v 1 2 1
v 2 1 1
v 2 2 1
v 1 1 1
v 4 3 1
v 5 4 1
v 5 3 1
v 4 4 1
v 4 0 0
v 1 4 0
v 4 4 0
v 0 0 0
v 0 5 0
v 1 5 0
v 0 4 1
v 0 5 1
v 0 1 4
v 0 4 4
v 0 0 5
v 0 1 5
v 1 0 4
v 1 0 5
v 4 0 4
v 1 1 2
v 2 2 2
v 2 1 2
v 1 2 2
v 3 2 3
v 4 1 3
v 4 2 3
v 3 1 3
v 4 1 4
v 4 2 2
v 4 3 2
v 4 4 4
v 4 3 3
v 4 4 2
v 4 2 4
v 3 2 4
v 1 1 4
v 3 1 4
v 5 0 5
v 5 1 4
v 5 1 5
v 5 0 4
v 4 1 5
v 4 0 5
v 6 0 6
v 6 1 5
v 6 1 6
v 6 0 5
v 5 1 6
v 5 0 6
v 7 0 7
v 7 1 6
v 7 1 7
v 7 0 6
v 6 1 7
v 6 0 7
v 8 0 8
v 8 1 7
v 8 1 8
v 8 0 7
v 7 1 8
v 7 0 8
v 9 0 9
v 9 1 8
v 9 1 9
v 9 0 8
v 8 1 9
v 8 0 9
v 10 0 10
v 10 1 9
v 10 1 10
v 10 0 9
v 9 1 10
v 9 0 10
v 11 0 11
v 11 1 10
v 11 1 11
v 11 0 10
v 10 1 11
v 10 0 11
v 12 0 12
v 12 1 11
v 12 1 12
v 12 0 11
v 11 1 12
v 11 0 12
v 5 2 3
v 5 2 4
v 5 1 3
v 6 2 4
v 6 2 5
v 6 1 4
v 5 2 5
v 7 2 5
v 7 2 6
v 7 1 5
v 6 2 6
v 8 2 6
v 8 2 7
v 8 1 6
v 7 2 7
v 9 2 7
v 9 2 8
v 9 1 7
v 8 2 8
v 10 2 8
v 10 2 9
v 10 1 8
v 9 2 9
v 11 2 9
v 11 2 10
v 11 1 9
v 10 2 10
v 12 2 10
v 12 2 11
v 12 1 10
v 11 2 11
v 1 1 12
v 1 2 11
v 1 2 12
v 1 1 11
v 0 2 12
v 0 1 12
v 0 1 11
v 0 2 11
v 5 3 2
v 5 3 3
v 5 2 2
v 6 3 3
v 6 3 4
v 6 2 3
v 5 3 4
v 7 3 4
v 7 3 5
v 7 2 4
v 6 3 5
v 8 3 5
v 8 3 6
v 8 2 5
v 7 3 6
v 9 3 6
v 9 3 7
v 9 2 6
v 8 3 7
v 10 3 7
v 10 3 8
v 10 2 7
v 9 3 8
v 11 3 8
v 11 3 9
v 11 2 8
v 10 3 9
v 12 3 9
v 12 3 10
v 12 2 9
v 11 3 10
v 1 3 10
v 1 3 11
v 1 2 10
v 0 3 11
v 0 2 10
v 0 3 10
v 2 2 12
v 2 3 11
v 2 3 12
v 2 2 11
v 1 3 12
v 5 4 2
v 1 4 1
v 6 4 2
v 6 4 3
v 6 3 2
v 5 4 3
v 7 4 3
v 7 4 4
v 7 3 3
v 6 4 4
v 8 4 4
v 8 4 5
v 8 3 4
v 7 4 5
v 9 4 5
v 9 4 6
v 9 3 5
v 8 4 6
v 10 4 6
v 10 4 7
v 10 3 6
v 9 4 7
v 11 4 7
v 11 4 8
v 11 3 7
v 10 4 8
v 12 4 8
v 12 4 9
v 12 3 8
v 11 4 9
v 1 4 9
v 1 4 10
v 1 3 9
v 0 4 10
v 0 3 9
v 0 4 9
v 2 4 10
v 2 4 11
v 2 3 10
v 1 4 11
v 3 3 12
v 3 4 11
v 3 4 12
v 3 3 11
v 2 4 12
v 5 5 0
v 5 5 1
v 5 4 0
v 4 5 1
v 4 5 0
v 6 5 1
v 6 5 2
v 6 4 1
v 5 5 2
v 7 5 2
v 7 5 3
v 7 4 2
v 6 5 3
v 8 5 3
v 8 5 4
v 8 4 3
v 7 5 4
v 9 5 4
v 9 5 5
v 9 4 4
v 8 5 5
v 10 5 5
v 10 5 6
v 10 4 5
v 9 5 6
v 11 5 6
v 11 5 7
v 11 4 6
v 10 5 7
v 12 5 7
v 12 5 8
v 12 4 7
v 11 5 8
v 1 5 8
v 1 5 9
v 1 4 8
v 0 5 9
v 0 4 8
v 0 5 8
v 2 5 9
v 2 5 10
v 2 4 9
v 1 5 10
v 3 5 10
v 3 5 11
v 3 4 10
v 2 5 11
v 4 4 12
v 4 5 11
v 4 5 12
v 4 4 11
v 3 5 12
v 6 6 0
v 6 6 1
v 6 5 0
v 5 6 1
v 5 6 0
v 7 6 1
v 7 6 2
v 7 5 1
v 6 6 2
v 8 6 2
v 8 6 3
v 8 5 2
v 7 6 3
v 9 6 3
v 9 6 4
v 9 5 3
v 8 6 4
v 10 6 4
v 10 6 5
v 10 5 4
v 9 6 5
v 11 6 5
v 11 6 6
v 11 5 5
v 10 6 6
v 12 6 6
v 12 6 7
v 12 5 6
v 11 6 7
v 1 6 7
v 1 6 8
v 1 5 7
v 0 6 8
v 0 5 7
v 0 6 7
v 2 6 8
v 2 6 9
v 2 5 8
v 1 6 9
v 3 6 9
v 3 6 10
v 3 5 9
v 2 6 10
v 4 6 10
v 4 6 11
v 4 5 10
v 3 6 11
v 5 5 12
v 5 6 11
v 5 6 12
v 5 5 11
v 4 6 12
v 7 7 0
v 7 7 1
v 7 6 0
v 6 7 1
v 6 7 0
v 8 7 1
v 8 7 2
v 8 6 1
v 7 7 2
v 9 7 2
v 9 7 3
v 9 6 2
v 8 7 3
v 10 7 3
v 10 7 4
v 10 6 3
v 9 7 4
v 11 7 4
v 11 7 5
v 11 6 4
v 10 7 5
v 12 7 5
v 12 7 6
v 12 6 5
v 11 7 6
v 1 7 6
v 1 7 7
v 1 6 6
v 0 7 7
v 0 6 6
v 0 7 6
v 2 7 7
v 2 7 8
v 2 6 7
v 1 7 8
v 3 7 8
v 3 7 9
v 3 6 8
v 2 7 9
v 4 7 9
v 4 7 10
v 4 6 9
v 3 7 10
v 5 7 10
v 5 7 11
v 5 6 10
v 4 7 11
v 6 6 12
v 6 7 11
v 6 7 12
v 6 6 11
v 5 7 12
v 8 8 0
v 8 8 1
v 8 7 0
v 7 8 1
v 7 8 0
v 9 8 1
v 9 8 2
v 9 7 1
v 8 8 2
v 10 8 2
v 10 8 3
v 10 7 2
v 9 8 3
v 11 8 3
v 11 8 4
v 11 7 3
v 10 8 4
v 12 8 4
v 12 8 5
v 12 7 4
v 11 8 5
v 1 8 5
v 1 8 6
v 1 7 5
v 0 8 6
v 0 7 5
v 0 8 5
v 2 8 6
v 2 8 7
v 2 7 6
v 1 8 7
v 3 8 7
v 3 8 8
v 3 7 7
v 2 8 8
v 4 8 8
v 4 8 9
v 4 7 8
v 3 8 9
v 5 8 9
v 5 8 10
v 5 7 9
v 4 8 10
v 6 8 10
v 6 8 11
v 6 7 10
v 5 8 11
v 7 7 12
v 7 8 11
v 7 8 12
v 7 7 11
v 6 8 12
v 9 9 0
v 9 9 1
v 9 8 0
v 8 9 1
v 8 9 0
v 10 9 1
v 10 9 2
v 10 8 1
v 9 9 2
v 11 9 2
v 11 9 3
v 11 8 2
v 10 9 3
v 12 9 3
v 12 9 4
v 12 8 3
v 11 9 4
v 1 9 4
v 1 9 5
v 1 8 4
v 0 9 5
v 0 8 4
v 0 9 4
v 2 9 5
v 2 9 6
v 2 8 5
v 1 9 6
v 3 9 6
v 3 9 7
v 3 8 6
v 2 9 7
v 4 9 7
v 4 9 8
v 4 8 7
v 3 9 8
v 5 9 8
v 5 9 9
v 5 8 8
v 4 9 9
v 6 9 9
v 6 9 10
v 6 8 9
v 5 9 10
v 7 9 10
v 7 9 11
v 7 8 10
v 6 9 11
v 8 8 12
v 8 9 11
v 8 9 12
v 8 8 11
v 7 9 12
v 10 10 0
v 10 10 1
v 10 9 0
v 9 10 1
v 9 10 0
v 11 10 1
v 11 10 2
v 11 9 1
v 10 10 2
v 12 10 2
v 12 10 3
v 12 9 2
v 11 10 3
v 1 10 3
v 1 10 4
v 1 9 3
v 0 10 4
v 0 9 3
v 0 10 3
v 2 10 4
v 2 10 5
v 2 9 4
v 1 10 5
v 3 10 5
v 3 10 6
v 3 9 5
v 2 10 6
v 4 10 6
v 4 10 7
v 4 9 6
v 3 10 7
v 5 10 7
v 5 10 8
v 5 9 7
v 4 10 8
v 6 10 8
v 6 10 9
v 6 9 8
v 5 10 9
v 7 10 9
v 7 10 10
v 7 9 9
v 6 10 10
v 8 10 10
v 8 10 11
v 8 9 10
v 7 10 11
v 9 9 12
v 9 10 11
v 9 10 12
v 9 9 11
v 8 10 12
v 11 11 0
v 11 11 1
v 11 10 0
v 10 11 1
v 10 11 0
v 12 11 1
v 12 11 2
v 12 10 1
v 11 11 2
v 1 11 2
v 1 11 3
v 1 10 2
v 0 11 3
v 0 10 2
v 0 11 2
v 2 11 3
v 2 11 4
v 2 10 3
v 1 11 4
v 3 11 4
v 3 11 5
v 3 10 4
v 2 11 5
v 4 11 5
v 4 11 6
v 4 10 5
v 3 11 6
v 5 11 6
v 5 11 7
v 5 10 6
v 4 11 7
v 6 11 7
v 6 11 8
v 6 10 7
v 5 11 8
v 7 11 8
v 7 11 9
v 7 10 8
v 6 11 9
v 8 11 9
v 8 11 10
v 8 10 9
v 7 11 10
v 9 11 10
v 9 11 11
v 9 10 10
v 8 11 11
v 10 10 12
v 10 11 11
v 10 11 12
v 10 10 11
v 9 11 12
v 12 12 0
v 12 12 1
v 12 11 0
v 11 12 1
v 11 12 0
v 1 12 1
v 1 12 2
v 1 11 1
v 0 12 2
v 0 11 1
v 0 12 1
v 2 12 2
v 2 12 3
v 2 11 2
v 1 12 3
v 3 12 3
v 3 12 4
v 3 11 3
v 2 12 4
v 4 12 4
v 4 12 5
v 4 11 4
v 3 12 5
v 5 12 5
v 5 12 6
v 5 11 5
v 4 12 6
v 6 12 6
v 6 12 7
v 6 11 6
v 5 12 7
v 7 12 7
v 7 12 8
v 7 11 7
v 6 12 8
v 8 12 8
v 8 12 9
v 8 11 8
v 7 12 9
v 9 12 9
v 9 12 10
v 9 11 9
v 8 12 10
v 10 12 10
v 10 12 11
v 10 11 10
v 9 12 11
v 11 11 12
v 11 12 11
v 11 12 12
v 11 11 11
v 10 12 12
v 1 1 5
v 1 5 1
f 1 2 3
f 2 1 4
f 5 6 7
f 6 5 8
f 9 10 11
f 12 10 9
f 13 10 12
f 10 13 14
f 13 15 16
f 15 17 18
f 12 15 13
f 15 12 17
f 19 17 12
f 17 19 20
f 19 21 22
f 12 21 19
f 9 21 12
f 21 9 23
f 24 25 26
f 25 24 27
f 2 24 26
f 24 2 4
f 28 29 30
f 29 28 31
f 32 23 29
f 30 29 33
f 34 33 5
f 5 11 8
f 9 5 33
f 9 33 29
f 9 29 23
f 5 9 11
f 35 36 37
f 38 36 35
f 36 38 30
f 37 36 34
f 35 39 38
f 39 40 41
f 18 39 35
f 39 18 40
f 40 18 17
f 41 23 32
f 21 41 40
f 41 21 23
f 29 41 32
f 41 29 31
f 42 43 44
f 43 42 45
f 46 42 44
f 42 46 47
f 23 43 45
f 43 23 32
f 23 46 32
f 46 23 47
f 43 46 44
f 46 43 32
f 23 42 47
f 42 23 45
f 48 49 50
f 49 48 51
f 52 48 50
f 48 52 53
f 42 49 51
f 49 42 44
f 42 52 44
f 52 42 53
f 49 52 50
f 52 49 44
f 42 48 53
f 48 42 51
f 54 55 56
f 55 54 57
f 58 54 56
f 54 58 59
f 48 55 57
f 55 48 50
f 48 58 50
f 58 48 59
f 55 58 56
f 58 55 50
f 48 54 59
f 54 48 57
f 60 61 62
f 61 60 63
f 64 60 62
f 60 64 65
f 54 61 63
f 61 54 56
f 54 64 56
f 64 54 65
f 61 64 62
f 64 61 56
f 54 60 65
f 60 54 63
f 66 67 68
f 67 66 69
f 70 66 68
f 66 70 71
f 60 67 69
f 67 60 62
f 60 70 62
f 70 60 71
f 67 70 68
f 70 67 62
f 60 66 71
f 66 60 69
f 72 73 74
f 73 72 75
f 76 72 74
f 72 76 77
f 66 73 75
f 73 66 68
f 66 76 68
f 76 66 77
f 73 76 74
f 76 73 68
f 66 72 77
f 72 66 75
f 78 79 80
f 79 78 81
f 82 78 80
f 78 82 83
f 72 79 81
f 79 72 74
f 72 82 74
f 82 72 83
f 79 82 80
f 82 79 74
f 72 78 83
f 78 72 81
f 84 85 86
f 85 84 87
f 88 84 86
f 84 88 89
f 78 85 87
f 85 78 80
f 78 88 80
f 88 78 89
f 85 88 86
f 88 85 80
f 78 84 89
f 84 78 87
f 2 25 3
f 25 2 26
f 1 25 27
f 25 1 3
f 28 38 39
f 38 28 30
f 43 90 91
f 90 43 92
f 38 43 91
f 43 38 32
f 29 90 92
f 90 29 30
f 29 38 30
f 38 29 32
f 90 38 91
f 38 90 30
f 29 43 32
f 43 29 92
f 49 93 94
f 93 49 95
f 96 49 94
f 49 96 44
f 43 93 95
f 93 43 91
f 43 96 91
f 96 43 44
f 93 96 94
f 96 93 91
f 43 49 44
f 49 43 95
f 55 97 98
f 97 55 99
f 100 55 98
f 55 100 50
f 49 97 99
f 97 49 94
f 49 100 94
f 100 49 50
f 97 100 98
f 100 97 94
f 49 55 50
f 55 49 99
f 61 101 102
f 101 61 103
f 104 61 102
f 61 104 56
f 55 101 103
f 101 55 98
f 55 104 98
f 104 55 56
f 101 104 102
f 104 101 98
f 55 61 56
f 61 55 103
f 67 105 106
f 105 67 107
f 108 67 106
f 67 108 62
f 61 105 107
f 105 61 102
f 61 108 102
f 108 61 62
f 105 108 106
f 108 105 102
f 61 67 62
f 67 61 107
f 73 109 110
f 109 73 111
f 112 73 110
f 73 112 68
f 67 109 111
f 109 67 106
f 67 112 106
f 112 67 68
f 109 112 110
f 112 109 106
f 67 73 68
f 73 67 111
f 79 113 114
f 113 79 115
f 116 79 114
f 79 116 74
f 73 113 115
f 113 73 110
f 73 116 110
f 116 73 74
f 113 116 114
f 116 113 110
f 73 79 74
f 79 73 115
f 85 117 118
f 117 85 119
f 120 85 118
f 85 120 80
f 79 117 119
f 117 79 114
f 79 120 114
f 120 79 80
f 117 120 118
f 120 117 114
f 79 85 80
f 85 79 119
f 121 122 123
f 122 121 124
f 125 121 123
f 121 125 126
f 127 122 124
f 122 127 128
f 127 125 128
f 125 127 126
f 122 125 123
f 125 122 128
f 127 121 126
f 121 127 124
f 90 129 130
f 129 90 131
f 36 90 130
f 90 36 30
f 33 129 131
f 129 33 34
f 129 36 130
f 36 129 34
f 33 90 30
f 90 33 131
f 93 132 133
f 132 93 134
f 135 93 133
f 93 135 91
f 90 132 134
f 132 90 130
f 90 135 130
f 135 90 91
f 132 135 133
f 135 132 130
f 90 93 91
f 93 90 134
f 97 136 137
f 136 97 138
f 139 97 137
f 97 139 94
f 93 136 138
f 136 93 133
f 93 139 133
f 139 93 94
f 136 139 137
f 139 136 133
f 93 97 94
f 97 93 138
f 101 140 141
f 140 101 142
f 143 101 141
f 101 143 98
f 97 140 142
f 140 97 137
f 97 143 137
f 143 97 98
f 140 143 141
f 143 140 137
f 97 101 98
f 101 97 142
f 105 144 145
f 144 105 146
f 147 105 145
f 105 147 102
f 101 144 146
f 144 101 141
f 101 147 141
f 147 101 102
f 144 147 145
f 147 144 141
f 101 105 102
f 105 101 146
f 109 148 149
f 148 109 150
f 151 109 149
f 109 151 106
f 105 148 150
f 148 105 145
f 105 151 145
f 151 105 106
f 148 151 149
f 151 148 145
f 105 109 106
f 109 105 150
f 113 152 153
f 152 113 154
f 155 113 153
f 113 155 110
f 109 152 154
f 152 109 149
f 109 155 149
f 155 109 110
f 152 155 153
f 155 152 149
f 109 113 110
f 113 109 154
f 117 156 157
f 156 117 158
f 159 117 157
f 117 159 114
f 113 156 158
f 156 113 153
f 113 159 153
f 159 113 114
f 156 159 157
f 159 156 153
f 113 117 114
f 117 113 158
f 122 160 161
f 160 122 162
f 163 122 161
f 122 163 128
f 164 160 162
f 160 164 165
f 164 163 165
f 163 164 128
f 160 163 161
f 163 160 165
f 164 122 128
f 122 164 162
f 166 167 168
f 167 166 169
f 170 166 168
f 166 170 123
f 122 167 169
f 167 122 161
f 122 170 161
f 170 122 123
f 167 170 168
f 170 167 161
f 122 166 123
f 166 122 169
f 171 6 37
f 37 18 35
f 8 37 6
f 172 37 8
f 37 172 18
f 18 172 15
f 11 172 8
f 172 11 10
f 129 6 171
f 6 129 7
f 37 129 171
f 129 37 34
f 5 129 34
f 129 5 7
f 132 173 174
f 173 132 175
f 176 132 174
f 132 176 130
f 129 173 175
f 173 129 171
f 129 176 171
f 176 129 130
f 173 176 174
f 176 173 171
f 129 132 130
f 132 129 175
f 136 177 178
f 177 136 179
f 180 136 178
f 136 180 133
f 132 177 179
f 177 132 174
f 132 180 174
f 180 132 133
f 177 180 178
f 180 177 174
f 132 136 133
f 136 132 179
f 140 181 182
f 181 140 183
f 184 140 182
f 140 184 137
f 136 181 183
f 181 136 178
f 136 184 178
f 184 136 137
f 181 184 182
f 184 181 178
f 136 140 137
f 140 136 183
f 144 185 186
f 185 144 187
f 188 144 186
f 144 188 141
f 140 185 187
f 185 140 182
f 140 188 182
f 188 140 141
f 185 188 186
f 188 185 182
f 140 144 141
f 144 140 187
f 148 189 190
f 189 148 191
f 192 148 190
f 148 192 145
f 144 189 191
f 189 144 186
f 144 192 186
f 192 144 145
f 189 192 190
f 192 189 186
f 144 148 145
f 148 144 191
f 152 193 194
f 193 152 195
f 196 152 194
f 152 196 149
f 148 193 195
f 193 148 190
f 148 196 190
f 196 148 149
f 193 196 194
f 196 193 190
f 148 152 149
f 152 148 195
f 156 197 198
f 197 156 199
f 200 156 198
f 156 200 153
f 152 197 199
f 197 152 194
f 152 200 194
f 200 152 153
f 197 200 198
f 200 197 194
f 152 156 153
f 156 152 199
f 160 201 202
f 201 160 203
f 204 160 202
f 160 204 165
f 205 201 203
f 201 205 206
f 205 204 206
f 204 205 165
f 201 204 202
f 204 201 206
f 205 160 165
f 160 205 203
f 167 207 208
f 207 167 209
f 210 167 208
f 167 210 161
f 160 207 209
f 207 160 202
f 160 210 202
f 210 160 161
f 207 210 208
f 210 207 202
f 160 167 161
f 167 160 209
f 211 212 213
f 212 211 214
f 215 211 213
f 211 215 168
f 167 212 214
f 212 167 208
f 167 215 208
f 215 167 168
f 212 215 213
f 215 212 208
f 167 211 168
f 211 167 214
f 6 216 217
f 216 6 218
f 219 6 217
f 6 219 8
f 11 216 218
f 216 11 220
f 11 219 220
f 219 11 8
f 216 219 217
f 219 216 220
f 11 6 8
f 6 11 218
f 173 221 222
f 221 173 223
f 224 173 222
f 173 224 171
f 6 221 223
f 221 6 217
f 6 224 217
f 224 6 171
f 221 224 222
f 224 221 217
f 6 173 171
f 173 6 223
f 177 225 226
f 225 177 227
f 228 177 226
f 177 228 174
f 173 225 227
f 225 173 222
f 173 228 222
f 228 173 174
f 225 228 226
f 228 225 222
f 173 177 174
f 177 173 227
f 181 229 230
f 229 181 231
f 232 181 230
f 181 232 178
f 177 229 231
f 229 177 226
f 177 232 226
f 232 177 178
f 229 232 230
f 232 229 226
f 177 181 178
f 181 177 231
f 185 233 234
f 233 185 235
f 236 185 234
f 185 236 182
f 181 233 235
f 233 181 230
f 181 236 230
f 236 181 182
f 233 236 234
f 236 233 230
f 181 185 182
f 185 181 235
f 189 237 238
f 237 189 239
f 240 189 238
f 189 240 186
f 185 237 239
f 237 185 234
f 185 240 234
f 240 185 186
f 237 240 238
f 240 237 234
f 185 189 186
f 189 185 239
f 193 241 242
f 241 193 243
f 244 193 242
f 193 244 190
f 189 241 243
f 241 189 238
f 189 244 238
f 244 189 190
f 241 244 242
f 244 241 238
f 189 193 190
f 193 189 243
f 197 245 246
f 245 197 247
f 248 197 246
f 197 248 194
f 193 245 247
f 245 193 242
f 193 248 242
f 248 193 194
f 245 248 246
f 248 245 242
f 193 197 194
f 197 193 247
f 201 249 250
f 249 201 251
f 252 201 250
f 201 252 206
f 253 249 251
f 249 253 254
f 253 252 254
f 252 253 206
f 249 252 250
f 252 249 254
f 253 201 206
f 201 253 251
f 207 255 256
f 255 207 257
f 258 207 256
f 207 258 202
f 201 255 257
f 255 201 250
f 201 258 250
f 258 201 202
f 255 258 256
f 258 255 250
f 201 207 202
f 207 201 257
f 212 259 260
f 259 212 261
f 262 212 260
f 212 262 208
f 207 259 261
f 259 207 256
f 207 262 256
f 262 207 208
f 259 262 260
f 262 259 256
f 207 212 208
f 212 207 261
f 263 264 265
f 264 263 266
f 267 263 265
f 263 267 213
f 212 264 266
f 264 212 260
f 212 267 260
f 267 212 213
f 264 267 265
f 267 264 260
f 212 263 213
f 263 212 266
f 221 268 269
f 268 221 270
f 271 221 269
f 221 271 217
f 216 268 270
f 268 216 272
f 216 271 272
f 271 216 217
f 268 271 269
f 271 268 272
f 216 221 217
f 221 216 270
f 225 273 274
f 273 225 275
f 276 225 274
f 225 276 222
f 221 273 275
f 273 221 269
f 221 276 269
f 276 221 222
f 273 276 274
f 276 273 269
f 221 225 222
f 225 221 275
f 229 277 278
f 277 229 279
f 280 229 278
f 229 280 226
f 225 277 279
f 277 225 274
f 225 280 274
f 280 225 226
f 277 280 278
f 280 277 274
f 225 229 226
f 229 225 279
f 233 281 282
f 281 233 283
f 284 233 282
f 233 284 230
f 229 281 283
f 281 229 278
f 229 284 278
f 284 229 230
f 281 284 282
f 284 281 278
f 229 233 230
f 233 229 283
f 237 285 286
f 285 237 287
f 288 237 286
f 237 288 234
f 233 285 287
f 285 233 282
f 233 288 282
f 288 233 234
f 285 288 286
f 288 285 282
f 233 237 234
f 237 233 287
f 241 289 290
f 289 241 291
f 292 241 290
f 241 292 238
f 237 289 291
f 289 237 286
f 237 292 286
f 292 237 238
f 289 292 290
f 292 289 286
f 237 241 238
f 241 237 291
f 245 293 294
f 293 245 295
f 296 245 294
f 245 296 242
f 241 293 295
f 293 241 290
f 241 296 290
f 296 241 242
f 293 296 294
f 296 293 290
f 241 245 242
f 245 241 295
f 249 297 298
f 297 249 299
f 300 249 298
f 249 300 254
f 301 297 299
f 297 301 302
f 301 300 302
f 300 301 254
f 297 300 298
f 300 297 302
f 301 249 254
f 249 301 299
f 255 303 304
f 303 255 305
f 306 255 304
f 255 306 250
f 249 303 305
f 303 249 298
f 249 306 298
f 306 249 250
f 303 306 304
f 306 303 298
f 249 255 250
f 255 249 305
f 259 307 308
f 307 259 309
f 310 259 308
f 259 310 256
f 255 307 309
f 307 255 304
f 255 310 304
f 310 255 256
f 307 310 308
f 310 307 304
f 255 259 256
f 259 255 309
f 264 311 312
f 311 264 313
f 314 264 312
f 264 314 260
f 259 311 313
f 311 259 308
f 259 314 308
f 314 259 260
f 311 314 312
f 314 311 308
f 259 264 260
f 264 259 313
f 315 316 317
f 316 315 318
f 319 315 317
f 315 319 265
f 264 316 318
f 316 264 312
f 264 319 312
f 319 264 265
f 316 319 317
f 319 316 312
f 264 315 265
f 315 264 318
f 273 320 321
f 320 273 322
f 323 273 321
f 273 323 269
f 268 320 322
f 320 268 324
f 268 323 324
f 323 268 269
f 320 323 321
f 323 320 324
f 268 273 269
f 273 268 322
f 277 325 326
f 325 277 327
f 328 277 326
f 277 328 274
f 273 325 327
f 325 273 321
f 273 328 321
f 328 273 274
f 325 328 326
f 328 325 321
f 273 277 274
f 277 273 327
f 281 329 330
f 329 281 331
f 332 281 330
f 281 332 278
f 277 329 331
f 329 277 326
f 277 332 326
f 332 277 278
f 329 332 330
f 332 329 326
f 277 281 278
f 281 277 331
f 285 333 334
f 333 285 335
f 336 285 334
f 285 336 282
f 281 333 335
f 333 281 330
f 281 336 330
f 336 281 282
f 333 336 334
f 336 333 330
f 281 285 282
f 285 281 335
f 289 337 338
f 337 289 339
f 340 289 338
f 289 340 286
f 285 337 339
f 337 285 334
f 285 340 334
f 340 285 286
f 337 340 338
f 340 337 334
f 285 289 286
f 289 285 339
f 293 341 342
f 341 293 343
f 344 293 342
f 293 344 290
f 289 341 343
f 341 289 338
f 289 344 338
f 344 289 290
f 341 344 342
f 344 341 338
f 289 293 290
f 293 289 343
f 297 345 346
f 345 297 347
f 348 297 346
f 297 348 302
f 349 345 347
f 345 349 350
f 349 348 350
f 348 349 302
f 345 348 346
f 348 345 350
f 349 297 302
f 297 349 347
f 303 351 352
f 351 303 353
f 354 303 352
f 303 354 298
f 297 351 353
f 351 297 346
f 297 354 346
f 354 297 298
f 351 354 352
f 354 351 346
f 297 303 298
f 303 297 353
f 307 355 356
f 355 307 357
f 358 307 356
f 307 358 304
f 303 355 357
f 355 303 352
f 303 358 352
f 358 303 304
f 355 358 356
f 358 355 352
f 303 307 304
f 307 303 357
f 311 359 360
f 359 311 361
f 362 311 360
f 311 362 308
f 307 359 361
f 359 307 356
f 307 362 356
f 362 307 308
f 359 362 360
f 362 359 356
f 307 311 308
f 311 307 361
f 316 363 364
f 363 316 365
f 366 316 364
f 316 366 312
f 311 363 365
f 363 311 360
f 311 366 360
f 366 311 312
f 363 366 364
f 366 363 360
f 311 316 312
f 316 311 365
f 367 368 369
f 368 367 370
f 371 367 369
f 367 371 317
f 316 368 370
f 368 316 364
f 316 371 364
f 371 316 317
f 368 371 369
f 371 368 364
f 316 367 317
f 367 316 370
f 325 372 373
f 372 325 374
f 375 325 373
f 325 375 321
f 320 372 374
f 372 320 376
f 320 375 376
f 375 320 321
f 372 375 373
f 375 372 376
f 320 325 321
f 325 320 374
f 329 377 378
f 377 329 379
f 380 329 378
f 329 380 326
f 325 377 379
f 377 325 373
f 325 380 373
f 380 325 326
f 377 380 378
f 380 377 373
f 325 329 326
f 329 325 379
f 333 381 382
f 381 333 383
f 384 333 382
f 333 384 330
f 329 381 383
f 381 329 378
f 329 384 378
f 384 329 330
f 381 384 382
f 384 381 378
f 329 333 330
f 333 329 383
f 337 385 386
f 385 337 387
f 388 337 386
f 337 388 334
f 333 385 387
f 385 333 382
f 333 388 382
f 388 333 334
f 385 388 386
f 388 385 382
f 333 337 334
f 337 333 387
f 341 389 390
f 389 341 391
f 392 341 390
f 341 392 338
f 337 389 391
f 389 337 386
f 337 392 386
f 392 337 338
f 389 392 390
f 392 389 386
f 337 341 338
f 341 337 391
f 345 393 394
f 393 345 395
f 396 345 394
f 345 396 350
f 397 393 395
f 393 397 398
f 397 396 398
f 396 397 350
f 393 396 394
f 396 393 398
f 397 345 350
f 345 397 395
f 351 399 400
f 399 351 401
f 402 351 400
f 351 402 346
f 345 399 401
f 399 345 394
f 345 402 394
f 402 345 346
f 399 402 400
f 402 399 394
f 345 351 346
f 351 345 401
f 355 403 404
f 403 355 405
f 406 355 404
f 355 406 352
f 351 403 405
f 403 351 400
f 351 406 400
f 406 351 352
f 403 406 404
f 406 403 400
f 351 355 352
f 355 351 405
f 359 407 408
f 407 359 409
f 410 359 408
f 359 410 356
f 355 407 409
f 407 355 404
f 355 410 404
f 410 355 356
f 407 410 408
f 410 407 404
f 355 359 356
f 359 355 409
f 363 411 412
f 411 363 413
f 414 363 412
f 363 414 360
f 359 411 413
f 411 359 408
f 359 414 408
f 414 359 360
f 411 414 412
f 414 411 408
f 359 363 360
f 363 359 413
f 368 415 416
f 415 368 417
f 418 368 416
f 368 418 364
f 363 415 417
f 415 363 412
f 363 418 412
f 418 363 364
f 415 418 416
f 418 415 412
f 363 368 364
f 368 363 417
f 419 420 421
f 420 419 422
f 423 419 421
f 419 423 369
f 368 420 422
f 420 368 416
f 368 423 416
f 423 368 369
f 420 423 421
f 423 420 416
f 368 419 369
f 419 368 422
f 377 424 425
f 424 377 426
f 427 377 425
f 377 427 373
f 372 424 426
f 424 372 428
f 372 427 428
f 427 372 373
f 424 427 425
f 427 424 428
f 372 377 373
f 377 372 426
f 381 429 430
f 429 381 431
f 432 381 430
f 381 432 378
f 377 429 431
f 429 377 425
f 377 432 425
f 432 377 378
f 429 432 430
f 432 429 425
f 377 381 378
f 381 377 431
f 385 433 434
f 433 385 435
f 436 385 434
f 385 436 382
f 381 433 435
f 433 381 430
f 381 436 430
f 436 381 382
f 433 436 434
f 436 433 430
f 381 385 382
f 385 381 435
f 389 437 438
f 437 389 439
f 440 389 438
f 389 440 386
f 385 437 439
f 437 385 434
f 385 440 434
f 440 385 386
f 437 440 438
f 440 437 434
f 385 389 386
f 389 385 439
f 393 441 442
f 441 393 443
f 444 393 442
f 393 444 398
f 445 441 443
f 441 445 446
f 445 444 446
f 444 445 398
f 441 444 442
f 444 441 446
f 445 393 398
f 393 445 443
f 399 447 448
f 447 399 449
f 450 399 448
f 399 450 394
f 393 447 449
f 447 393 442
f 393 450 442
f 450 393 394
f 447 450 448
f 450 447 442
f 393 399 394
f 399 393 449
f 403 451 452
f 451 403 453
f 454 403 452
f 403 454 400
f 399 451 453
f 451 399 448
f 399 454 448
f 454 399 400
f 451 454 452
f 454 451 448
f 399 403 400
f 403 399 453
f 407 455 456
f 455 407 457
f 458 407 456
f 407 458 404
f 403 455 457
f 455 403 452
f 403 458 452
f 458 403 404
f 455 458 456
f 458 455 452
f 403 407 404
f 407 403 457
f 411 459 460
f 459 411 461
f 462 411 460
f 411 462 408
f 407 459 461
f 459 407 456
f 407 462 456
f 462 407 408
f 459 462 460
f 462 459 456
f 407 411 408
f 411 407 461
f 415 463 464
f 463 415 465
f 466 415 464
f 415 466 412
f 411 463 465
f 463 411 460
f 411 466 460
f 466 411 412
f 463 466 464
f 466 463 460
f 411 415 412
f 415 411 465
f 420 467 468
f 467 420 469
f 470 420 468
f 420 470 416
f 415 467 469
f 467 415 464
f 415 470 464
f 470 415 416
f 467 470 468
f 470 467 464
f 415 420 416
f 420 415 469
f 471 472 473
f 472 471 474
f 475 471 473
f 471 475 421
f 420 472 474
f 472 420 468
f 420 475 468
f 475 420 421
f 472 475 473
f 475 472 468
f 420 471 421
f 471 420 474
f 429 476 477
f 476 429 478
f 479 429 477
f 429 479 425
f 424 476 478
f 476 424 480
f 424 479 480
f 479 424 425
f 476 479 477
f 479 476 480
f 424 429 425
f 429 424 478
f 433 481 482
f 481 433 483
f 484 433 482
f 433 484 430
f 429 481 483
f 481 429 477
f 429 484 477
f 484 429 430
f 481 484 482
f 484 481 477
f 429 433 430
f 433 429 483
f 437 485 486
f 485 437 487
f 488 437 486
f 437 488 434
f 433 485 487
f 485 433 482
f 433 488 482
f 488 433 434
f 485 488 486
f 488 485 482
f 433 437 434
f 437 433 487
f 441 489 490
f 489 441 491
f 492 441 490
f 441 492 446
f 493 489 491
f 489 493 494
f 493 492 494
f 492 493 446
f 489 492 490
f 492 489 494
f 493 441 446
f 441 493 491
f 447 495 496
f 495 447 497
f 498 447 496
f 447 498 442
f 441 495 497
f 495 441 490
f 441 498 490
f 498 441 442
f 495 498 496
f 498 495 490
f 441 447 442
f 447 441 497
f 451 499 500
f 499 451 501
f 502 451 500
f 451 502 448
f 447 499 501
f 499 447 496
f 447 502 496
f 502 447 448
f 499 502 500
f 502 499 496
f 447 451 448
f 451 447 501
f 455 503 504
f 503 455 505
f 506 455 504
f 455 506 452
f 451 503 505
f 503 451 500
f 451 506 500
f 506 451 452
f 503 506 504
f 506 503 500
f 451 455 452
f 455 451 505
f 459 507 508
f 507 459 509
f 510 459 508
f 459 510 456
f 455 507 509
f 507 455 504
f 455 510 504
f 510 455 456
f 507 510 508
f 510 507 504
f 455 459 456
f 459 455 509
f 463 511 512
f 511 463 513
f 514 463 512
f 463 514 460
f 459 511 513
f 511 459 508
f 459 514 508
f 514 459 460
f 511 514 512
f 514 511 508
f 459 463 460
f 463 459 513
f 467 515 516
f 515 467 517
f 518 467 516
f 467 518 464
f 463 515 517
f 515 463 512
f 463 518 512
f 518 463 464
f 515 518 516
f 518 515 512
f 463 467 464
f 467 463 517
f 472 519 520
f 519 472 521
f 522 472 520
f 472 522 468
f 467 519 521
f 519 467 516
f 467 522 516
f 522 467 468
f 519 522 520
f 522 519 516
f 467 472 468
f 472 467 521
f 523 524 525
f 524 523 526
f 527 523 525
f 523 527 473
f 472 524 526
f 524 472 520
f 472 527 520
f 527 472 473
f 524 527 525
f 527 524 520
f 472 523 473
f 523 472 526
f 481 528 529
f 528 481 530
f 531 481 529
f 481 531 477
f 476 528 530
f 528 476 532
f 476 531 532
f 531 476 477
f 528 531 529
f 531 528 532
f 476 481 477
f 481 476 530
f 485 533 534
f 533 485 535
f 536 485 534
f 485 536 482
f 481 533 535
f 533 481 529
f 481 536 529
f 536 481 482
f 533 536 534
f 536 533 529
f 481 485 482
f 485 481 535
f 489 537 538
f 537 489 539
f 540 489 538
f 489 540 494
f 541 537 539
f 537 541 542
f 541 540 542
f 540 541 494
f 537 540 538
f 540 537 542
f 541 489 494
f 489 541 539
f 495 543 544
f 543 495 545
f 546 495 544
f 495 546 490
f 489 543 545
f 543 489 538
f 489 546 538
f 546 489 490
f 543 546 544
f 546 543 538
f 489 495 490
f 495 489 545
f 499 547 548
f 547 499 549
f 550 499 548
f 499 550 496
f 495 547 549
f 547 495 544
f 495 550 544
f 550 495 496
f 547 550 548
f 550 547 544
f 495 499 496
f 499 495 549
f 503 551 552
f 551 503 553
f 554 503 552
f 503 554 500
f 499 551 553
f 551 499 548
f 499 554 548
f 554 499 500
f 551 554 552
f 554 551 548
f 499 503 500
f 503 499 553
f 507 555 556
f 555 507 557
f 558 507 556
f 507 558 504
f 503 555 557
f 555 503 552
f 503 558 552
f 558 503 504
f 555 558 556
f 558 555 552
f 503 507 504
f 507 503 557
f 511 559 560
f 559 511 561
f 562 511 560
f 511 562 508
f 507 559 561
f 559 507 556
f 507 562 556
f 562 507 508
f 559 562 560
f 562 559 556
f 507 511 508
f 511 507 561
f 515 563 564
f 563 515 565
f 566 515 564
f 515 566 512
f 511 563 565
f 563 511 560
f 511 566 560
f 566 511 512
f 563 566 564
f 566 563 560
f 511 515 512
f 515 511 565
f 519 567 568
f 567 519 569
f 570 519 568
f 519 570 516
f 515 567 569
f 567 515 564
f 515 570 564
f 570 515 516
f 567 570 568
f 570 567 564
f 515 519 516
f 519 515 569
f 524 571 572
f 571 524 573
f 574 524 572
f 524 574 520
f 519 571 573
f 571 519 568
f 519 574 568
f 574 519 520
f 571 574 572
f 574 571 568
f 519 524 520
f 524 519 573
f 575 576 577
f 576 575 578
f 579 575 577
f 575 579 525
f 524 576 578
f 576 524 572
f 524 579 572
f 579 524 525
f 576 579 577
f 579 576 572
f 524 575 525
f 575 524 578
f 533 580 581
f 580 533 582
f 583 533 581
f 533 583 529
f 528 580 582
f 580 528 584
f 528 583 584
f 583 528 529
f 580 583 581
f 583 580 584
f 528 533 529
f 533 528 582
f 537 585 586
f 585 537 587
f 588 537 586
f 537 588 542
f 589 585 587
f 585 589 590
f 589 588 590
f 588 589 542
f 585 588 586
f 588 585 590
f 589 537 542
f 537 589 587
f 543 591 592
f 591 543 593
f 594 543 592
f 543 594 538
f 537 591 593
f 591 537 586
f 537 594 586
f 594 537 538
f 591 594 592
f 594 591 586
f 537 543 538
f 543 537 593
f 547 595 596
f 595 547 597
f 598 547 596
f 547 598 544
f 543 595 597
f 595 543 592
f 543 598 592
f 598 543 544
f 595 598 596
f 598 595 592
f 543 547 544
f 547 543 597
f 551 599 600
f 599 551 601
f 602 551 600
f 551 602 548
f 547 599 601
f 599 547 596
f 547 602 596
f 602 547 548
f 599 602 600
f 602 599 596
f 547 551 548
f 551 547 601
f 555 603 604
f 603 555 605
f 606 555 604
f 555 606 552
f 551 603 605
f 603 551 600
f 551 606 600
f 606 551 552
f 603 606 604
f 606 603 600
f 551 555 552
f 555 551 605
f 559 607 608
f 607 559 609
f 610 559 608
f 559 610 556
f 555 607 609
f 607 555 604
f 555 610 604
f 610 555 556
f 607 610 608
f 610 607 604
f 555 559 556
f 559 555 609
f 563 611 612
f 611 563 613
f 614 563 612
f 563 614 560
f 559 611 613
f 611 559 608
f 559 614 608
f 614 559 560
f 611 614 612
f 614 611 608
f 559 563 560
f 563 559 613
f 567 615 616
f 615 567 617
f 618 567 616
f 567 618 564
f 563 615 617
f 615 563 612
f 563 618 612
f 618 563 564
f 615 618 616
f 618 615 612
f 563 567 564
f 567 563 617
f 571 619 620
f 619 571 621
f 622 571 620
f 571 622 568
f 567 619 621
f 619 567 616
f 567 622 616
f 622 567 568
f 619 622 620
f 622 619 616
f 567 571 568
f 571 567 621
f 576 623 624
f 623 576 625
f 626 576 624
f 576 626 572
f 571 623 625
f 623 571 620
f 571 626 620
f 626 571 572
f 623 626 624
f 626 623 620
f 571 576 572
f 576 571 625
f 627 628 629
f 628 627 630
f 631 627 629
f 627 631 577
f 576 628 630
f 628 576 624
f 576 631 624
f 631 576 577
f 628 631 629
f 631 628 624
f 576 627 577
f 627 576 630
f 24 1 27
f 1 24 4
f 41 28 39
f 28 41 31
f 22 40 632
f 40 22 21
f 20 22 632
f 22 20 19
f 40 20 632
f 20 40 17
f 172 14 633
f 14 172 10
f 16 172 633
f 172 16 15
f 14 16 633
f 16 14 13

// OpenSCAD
union() {
    translate([0.0, 0.0, 0.0]) cube([1, 1, 1]);
    translate([1.0, 0.0, 1.0]) cube([1, 1, 1]);
    translate([2.0, 0.0, 2.0]) cube([1, 1, 1]);
    translate([3.0, 0.0, 3.0]) cube([1, 1, 1]);
    translate([4.0, 0.0, 4.0]) cube([1, 1, 1]);
    translate([5.0, 0.0, 5.0]) cube([1, 1, 1]);
    translate([6.0, 0.0, 6.0]) cube([1, 1, 1]);
    translate([7.0, 0.0, 7.0]) cube([1, 1, 1]);
    translate([8.0, 0.0, 8.0]) cube([1, 1, 1]);
    translate([9.0, 0.0, 9.0]) cube([1, 1, 1]);
    translate([10.0, 0.0, 10.0]) cube([1, 1, 1]);
    translate([11.0, 0.0, 11.0]) cube([1, 1, 1]);
    translate([1.0, 1.0, 0.0]) cube([1, 1, 1]);
    translate([2.0, 1.0, 1.0]) cube([1, 1, 1]);
    translate([3.0, 1.0, 2.0]) cube([1, 1, 1]);
    translate([4.0, 1.0, 3.0]) cube([1, 1, 1]);
    translate([5.0, 1.0, 4.0]) cube([1, 1, 1]);
    translate([6.0, 1.0, 5.0]) cube([1, 1, 1]);
    translate([7.0, 1.0, 6.0]) cube([1, 1, 1]);
    translate([8.0, 1.0, 7.0]) cube([1, 1, 1]);
    translate([9.0, 1.0, 8.0]) cube([1, 1, 1]);
    translate([10.0, 1.0, 9.0]) cube([1, 1, 1]);
    translate([11.0, 1.0, 10.0]) cube([1, 1, 1]);
    translate([0.0, 1.0, 11.0]) cube([1, 1, 1]);
    translate([2.0, 2.0, 0.0]) cube([1, 1, 1]);
    translate([3.0, 2.0, 1.0]) cube([1, 1, 1]);
    translate([4.0, 2.0, 2.0]) cube([1, 1, 1]);
    translate([5.0, 2.0, 3.0]) cube([1, 1, 1]);
    translate([6.0, 2.0, 4.0]) cube([1, 1, 1]);
    translate([7.0, 2.0, 5.0]) cube([1, 1, 1]);
    translate([8.0, 2.0, 6.0]) cube([1, 1, 1]);
    translate([9.0, 2.0, 7.0]) cube([1, 1, 1]);
    translate([10.0, 2.0, 8.0]) cube([1, 1, 1]);
    translate([11.0, 2.0, 9.0]) cube([1, 1, 1]);
    translate([0.0, 2.0, 10.0]) cube([1, 1, 1]);
    translate([1.0, 2.0, 11.0]) cube([1, 1, 1]);
    translate([3.0, 3.0, 0.0]) cube([1, 1, 1]);
    translate([4.0, 3.0, 1.0]) cube([1, 1, 1]);
    translate([5.0, 3.0, 2.0]) cube([1, 1, 1]);
    translate([6.0, 3.0, 3.0]) cube([1, 1, 1]);
    translate([7.0, 3.0, 4.0]) cube([1, 1, 1]);
    translate([8.0, 3.0, 5.0]) cube([1, 1, 1]);
    translate([9.0, 3.0, 6.0]) cube([1, 1, 1]);
    translate([10.0, 3.0, 7.0]) cube([1, 1, 1]);
    translate([11.0, 3.0, 8.0]) cube([1, 1, 1]);
    translate([0.0, 3.0, 9.0]) cube([1, 1, 1]);
    translate([1.0, 3.0, 10.0]) cube([1, 1, 1]);
    translate([2.0, 3.0, 11.0]) cube([1, 1, 1]);
    translate([4.0, 4.0, 0.0]) cube([1, 1, 1]);
    translate([5.0, 4.0, 1.0]) cube([1, 1, 1]);
    translate([6.0, 4.0, 2.0]) cube([1, 1, 1]);
    translate([7.0, 4.0, 3.0]) cube([1, 1, 1]);
    translate([8.0, 4.0, 4.0]) cube([1, 1, 1]);
    translate([9.0, 4.0, 5.0]) cube([1, 1, 1]);
    translate([10.0, 4.0, 6.0]) cube([1, 1, 1]);
    translate([11.0, 4.0, 7.0]) cube([1, 1, 1]);
    translate([0.0, 4.0, 8.0]) cube([1, 1, 1]);
    translate([1.0, 4.0, 9.0]) cube([1, 1, 1]);
    translate([2.0, 4.0, 10.0]) cube([1, 1, 1]);
    translate([3.0, 4.0, 11.0]) cube([1, 1, 1]);
    translate([5.0, 5.0, 0.0]) cube([1, 1, 1]);
    translate([6.0, 5.0, 1.0]) cube([1, 1, 1]);
    translate([7.0, 5.0, 2.0]) cube([1, 1, 1]);
    translate([8.0, 5.0, 3.0]) cube([1, 1, 1]);
    translate([9.0, 5.0, 4.0]) cube([1, 1, 1]);
    translate([10.0, 5.0, 5.0]) cube([1, 1, 1]);
    translate([11.0, 5.0, 6.0]) cube([1, 1, 1]);
    translate([0.0, 5.0, 7.0]) cube([1, 1, 1]);
    translate([1.0, 5.0, 8.0]) cube([1, 1, 1]);
    translate([2.0, 5.0, 9.0]) cube([1, 1, 1]);
    translate([3.0, 5.0, 10.0]) cube([1, 1, 1]);
    translate([4.0, 5.0, 11.0]) cube([1, 1, 1]);
    translate([6.0, 6.0, 0.0]) cube([1, 1, 1]);
    translate([7.0, 6.0, 1.0]) cube([1, 1, 1]);
    translate([8.0, 6.0, 2.0]) cube([1, 1, 1]);
    translate([9.0, 6.0, 3.0]) cube([1, 1, 1]);
    translate([10.0, 6.0, 4.0]) cube([1, 1, 1]);
    translate([11.0, 6.0, 5.0]) cube([1, 1, 1]);
    translate([0.0, 6.0, 6.0]) cube([1, 1, 1]);
    translate([1.0, 6.0, 7.0]) cube([1, 1, 1]);
    translate([2.0, 6.0, 8.0]) cube([1, 1, 1]);
    translate([3.0, 6.0, 9.0]) cube([1, 1, 1]);
    translate([4.0, 6.0, 10.0]) cube([1, 1, 1]);
    translate([5.0, 6.0, 11.0]) cube([1, 1, 1]);
    translate([7.0, 7.0, 0.0]) cube([1, 1, 1]);
    translate([8.0, 7.0, 1.0]) cube([1, 1, 1]);
    translate([9.0, 7.0, 2.0]) cube([1, 1, 1]);
    translate([10.0, 7.0, 3.0]) cube([1, 1, 1]);
    translate([11.0, 7.0, 4.0]) cube([1, 1, 1]);
    translate([0.0, 7.0, 5.0]) cube([1, 1, 1]);
    translate([1.0, 7.0, 6.0]) cube([1, 1, 1]);
    translate([2.0, 7.0, 7.0]) cube([1, 1, 1]);
    translate([3.0, 7.0, 8.0]) cube([1, 1, 1]);
    translate([4.0, 7.0, 9.0]) cube([1, 1, 1]);
    translate([5.0, 7.0, 10.0]) cube([1, 1, 1]);
    translate([6.0, 7.0, 11.0]) cube([1, 1, 1]);
    translate([8.0, 8.0, 0.0]) cube([1, 1, 1]);
    translate([9.0, 8.0, 1.0]) cube([1, 1, 1]);
    translate([10.0, 8.0, 2.0]) cube([1, 1, 1]);
    translate([11.0, 8.0, 3.0]) cube([1, 1, 1]);
    translate([0.0, 8.0, 4.0]) cube([1, 1, 1]);
    translate([1.0, 8.0, 5.0]) cube([1, 1, 1]);
    translate([2.0, 8.0, 6.0]) cube([1, 1, 1]);
    translate([3.0, 8.0, 7.0]) cube([1, 1, 1]);
    translate([4.0, 8.0, 8.0]) cube([1, 1, 1]);
    translate([5.0, 8.0, 9.0]) cube([1, 1, 1]);
    translate([6.0, 8.0, 10.0]) cube([1, 1, 1]);
    translate([7.0, 8.0, 11.0]) cube([1, 1, 1]);
    translate([9.0, 9.0, 0.0]) cube([1, 1, 1]);
    translate([10.0, 9.0, 1.0]) cube([1, 1, 1]);
    translate([11.0, 9.0, 2.0]) cube([1, 1, 1]);
    translate([0.0, 9.0, 3.0]) cube([1, 1, 1]);
    translate([1.0, 9.0, 4.0]) cube([1, 1, 1]);
    translate([2.0, 9.0, 5.0]) cube([1, 1, 1]);
    translate([3.0, 9.0, 6.0]) cube([1, 1, 1]);
    translate([4.0, 9.0, 7.0]) cube([1, 1, 1]);
    translate([5.0, 9.0, 8.0]) cube([1, 1, 1]);
    translate([6.0, 9.0, 9.0]) cube([1, 1, 1]);
    translate([7.0, 9.0, 10.0]) cube([1, 1, 1]);
    translate([8.0, 9.0, 11.0]) cube([1, 1, 1]);
    translate([10.0, 10.0, 0.0]) cube([1, 1, 1]);
    translate([11.0, 10.0, 1.0]) cube([1, 1, 1]);
    translate([0.0, 10.0, 2.0]) cube([1, 1, 1]);
    translate([1.0, 10.0, 3.0]) cube([1, 1, 1]);
    translate([2.0, 10.0, 4.0]) cube([1, 1, 1]);
    translate([3.0, 10.0, 5.0]) cube([1, 1, 1]);
    translate([4.0, 10.0, 6.0]) cube([1, 1, 1]);
    translate([5.0, 10.0, 7.0]) cube([1, 1, 1]);
    translate([6.0, 10.0, 8.0]) cube([1, 1, 1]);
    translate([7.0, 10.0, 9.0]) cube([1, 1, 1]);
    translate([8.0, 10.0, 10.0]) cube([1, 1, 1]);
    translate([9.0, 10.0, 11.0]) cube([1, 1, 1]);
    translate([11.0, 11.0, 0.0]) cube([1, 1, 1]);
    translate([0.0, 11.0, 1.0]) cube([1, 1, 1]);
    translate([1.0, 11.0, 2.0]) cube([1, 1, 1]);
    translate([2.0, 11.0, 3.0]) cube([1, 1, 1]);
    translate([3.0, 11.0, 4.0]) cube([1, 1, 1]);
    translate([4.0, 11.0, 5.0]) cube([1, 1, 1]);
    translate([5.0, 11.0, 6.0]) cube([1, 1, 1]);
    translate([6.0, 11.0, 7.0]) cube([1, 1, 1]);
    translate([7.0, 11.0, 8.0]) cube([1, 1, 1]);
    translate([8.0, 11.0, 9.0]) cube([1, 1, 1]);
    translate([9.0, 11.0, 10.0]) cube([1, 1, 1]);
    translate([10.0, 11.0, 11.0]) cube([1, 1, 1]);
    translate([0.0, 0.0, 1.0]) cube([1, 1, 1]);
    translate([2.0, 0.0, 1.0]) cube([1, 1, 1]);
    translate([3.0, 0.0, 1.0]) cube([1, 1, 1]);
    translate([0.0, 0.0, 2.0]) cube([1, 1, 1]);
    translate([1.0, 0.0, 2.0]) cube([1, 1, 1]);
    translate([3.0, 0.0, 2.0]) cube([1, 1, 1]);
    translate([0.0, 0.0, 3.0]) cube([1, 1, 1]);
    translate([1.0, 0.0, 3.0]) cube([1, 1, 1]);
    translate([2.0, 0.0, 3.0]) cube([1, 1, 1]);
    translate([1.0, 1.0, 0.0]) cube([1, 1, 1]);
    translate([2.0, 1.0, 0.0]) cube([1, 1, 1]);
    translate([3.0, 1.0, 0.0]) cube([1, 1, 1]);
    translate([0.0, 1.0, 1.0]) cube([1, 1, 1]);
    translate([3.0, 1.0, 1.0]) cube([1, 1, 1]);
    translate([0.0, 1.0, 2.0]) cube([1, 1, 1]);
    translate([1.0, 1.0, 2.0]) cube([1, 1, 1]);
    translate([2.0, 1.0, 2.0]) cube([1, 1, 1]);
    translate([0.0, 1.0, 3.0]) cube([1, 1, 1]);
    translate([1.0, 1.0, 3.0]) cube([1, 1, 1]);
    translate([2.0, 1.0, 3.0]) cube([1, 1, 1]);
    translate([0.0, 2.0, 0.0]) cube([1, 1, 1]);
    translate([1.0, 2.0, 0.0]) cube([1, 1, 1]);
    translate([3.0, 2.0, 0.0]) cube([1, 1, 1]);
    translate([0.0, 2.0, 1.0]) cube([1, 1, 1]);
    translate([1.0, 2.0, 1.0]) cube([1, 1, 1]);
    translate([2.0, 2.0, 1.0]) cube([1, 1, 1]);
    translate([3.0, 2.0, 1.0]) cube([1, 1, 1]);
    translate([0.0, 2.0, 2.0]) cube([1, 1, 1]);
    translate([1.0, 2.0, 2.0]) cube([1, 1, 1]);
    translate([2.0, 2.0, 2.0]) cube([1, 1, 1]);
    translate([3.0, 2.0, 2.0]) cube([1, 1, 1]);
    translate([0.0, 2.0, 3.0]) cube([1, 1, 1]);
    translate([1.0, 2.0, 3.0]) cube([1, 1, 1]);
    translate([2.0, 2.0, 3.0]) cube([1, 1, 1]);
    translate([3.0, 2.0, 3.0]) cube([1, 1, 1]);
    translate([0.0, 3.0, 0.0]) cube([1, 1, 1]);
    translate([1.0, 3.0, 0.0]) cube([1, 1, 1]);
    translate([2.0, 3.0, 0.0]) cube([1, 1, 1]);
    translate([0.0, 3.0, 1.0]) cube([1, 1, 1]);
    translate([1.0, 3.0, 1.0]) cube([1, 1, 1]);
    translate([2.0, 3.0, 1.0]) cube([1, 1, 1]);
    translate([3.0, 3.0, 1.0]) cube([1, 1, 1]);
    translate([0.0, 3.0, 2.0]) cube([1, 1, 1]);
    translate([1.0, 3.0, 2.0]) cube([1, 1, 1]);
    translate([2.0, 3.0, 2.0]) cube([1, 1, 1]);
    translate([3.0, 3.0, 2.0]) cube([1, 1, 1]);
    translate([0.0, 3.0, 3.0]) cube([1, 1, 1]);
    translate([1.0, 3.0, 3.0]) cube([1, 1, 1]);
    translate([2.0, 3.0, 3.0]) cube([1, 1, 1]);
    translate([3.0, 3.0, 3.0]) cube([1, 1, 1]);
    translate([1.0, 0.0, 0.0]) cube([1, 1, 1]);
    translate([2.0, 0.0, 0.0]) cube([1, 1, 1]);
    translate([3.0, 0.0, 0.0]) cube([1, 1, 1]);
    translate([0.0, 1.0, 0.0]) cube([1, 1, 1]);
    translate([2.0, 1.0, 0.0]) cube([1, 1, 1]);
    translate([3.0, 1.0, 0.0]) cube([1, 1, 1]);
    translate([0.0, 2.0, 0.0]) cube([1, 1, 1]);
    translate([1.0, 2.0, 0.0]) cube([1, 1, 1]);
    translate([3.0, 2.0, 0.0]) cube([1, 1, 1]);
    translate([1.0, 3.0, 0.0]) cube([1, 1, 1]);
    translate([2.0, 3.0, 0.0]) cube([1, 1, 1]);
    translate([3.0, 3.0, 0.0]) cube([1, 1, 1]);
    translate([0.0, 0.0, 4.0]) cube([1, 1, 1]);
    translate([0.0, 4.0, 0.0]) cube([1, 1, 1]);
}
